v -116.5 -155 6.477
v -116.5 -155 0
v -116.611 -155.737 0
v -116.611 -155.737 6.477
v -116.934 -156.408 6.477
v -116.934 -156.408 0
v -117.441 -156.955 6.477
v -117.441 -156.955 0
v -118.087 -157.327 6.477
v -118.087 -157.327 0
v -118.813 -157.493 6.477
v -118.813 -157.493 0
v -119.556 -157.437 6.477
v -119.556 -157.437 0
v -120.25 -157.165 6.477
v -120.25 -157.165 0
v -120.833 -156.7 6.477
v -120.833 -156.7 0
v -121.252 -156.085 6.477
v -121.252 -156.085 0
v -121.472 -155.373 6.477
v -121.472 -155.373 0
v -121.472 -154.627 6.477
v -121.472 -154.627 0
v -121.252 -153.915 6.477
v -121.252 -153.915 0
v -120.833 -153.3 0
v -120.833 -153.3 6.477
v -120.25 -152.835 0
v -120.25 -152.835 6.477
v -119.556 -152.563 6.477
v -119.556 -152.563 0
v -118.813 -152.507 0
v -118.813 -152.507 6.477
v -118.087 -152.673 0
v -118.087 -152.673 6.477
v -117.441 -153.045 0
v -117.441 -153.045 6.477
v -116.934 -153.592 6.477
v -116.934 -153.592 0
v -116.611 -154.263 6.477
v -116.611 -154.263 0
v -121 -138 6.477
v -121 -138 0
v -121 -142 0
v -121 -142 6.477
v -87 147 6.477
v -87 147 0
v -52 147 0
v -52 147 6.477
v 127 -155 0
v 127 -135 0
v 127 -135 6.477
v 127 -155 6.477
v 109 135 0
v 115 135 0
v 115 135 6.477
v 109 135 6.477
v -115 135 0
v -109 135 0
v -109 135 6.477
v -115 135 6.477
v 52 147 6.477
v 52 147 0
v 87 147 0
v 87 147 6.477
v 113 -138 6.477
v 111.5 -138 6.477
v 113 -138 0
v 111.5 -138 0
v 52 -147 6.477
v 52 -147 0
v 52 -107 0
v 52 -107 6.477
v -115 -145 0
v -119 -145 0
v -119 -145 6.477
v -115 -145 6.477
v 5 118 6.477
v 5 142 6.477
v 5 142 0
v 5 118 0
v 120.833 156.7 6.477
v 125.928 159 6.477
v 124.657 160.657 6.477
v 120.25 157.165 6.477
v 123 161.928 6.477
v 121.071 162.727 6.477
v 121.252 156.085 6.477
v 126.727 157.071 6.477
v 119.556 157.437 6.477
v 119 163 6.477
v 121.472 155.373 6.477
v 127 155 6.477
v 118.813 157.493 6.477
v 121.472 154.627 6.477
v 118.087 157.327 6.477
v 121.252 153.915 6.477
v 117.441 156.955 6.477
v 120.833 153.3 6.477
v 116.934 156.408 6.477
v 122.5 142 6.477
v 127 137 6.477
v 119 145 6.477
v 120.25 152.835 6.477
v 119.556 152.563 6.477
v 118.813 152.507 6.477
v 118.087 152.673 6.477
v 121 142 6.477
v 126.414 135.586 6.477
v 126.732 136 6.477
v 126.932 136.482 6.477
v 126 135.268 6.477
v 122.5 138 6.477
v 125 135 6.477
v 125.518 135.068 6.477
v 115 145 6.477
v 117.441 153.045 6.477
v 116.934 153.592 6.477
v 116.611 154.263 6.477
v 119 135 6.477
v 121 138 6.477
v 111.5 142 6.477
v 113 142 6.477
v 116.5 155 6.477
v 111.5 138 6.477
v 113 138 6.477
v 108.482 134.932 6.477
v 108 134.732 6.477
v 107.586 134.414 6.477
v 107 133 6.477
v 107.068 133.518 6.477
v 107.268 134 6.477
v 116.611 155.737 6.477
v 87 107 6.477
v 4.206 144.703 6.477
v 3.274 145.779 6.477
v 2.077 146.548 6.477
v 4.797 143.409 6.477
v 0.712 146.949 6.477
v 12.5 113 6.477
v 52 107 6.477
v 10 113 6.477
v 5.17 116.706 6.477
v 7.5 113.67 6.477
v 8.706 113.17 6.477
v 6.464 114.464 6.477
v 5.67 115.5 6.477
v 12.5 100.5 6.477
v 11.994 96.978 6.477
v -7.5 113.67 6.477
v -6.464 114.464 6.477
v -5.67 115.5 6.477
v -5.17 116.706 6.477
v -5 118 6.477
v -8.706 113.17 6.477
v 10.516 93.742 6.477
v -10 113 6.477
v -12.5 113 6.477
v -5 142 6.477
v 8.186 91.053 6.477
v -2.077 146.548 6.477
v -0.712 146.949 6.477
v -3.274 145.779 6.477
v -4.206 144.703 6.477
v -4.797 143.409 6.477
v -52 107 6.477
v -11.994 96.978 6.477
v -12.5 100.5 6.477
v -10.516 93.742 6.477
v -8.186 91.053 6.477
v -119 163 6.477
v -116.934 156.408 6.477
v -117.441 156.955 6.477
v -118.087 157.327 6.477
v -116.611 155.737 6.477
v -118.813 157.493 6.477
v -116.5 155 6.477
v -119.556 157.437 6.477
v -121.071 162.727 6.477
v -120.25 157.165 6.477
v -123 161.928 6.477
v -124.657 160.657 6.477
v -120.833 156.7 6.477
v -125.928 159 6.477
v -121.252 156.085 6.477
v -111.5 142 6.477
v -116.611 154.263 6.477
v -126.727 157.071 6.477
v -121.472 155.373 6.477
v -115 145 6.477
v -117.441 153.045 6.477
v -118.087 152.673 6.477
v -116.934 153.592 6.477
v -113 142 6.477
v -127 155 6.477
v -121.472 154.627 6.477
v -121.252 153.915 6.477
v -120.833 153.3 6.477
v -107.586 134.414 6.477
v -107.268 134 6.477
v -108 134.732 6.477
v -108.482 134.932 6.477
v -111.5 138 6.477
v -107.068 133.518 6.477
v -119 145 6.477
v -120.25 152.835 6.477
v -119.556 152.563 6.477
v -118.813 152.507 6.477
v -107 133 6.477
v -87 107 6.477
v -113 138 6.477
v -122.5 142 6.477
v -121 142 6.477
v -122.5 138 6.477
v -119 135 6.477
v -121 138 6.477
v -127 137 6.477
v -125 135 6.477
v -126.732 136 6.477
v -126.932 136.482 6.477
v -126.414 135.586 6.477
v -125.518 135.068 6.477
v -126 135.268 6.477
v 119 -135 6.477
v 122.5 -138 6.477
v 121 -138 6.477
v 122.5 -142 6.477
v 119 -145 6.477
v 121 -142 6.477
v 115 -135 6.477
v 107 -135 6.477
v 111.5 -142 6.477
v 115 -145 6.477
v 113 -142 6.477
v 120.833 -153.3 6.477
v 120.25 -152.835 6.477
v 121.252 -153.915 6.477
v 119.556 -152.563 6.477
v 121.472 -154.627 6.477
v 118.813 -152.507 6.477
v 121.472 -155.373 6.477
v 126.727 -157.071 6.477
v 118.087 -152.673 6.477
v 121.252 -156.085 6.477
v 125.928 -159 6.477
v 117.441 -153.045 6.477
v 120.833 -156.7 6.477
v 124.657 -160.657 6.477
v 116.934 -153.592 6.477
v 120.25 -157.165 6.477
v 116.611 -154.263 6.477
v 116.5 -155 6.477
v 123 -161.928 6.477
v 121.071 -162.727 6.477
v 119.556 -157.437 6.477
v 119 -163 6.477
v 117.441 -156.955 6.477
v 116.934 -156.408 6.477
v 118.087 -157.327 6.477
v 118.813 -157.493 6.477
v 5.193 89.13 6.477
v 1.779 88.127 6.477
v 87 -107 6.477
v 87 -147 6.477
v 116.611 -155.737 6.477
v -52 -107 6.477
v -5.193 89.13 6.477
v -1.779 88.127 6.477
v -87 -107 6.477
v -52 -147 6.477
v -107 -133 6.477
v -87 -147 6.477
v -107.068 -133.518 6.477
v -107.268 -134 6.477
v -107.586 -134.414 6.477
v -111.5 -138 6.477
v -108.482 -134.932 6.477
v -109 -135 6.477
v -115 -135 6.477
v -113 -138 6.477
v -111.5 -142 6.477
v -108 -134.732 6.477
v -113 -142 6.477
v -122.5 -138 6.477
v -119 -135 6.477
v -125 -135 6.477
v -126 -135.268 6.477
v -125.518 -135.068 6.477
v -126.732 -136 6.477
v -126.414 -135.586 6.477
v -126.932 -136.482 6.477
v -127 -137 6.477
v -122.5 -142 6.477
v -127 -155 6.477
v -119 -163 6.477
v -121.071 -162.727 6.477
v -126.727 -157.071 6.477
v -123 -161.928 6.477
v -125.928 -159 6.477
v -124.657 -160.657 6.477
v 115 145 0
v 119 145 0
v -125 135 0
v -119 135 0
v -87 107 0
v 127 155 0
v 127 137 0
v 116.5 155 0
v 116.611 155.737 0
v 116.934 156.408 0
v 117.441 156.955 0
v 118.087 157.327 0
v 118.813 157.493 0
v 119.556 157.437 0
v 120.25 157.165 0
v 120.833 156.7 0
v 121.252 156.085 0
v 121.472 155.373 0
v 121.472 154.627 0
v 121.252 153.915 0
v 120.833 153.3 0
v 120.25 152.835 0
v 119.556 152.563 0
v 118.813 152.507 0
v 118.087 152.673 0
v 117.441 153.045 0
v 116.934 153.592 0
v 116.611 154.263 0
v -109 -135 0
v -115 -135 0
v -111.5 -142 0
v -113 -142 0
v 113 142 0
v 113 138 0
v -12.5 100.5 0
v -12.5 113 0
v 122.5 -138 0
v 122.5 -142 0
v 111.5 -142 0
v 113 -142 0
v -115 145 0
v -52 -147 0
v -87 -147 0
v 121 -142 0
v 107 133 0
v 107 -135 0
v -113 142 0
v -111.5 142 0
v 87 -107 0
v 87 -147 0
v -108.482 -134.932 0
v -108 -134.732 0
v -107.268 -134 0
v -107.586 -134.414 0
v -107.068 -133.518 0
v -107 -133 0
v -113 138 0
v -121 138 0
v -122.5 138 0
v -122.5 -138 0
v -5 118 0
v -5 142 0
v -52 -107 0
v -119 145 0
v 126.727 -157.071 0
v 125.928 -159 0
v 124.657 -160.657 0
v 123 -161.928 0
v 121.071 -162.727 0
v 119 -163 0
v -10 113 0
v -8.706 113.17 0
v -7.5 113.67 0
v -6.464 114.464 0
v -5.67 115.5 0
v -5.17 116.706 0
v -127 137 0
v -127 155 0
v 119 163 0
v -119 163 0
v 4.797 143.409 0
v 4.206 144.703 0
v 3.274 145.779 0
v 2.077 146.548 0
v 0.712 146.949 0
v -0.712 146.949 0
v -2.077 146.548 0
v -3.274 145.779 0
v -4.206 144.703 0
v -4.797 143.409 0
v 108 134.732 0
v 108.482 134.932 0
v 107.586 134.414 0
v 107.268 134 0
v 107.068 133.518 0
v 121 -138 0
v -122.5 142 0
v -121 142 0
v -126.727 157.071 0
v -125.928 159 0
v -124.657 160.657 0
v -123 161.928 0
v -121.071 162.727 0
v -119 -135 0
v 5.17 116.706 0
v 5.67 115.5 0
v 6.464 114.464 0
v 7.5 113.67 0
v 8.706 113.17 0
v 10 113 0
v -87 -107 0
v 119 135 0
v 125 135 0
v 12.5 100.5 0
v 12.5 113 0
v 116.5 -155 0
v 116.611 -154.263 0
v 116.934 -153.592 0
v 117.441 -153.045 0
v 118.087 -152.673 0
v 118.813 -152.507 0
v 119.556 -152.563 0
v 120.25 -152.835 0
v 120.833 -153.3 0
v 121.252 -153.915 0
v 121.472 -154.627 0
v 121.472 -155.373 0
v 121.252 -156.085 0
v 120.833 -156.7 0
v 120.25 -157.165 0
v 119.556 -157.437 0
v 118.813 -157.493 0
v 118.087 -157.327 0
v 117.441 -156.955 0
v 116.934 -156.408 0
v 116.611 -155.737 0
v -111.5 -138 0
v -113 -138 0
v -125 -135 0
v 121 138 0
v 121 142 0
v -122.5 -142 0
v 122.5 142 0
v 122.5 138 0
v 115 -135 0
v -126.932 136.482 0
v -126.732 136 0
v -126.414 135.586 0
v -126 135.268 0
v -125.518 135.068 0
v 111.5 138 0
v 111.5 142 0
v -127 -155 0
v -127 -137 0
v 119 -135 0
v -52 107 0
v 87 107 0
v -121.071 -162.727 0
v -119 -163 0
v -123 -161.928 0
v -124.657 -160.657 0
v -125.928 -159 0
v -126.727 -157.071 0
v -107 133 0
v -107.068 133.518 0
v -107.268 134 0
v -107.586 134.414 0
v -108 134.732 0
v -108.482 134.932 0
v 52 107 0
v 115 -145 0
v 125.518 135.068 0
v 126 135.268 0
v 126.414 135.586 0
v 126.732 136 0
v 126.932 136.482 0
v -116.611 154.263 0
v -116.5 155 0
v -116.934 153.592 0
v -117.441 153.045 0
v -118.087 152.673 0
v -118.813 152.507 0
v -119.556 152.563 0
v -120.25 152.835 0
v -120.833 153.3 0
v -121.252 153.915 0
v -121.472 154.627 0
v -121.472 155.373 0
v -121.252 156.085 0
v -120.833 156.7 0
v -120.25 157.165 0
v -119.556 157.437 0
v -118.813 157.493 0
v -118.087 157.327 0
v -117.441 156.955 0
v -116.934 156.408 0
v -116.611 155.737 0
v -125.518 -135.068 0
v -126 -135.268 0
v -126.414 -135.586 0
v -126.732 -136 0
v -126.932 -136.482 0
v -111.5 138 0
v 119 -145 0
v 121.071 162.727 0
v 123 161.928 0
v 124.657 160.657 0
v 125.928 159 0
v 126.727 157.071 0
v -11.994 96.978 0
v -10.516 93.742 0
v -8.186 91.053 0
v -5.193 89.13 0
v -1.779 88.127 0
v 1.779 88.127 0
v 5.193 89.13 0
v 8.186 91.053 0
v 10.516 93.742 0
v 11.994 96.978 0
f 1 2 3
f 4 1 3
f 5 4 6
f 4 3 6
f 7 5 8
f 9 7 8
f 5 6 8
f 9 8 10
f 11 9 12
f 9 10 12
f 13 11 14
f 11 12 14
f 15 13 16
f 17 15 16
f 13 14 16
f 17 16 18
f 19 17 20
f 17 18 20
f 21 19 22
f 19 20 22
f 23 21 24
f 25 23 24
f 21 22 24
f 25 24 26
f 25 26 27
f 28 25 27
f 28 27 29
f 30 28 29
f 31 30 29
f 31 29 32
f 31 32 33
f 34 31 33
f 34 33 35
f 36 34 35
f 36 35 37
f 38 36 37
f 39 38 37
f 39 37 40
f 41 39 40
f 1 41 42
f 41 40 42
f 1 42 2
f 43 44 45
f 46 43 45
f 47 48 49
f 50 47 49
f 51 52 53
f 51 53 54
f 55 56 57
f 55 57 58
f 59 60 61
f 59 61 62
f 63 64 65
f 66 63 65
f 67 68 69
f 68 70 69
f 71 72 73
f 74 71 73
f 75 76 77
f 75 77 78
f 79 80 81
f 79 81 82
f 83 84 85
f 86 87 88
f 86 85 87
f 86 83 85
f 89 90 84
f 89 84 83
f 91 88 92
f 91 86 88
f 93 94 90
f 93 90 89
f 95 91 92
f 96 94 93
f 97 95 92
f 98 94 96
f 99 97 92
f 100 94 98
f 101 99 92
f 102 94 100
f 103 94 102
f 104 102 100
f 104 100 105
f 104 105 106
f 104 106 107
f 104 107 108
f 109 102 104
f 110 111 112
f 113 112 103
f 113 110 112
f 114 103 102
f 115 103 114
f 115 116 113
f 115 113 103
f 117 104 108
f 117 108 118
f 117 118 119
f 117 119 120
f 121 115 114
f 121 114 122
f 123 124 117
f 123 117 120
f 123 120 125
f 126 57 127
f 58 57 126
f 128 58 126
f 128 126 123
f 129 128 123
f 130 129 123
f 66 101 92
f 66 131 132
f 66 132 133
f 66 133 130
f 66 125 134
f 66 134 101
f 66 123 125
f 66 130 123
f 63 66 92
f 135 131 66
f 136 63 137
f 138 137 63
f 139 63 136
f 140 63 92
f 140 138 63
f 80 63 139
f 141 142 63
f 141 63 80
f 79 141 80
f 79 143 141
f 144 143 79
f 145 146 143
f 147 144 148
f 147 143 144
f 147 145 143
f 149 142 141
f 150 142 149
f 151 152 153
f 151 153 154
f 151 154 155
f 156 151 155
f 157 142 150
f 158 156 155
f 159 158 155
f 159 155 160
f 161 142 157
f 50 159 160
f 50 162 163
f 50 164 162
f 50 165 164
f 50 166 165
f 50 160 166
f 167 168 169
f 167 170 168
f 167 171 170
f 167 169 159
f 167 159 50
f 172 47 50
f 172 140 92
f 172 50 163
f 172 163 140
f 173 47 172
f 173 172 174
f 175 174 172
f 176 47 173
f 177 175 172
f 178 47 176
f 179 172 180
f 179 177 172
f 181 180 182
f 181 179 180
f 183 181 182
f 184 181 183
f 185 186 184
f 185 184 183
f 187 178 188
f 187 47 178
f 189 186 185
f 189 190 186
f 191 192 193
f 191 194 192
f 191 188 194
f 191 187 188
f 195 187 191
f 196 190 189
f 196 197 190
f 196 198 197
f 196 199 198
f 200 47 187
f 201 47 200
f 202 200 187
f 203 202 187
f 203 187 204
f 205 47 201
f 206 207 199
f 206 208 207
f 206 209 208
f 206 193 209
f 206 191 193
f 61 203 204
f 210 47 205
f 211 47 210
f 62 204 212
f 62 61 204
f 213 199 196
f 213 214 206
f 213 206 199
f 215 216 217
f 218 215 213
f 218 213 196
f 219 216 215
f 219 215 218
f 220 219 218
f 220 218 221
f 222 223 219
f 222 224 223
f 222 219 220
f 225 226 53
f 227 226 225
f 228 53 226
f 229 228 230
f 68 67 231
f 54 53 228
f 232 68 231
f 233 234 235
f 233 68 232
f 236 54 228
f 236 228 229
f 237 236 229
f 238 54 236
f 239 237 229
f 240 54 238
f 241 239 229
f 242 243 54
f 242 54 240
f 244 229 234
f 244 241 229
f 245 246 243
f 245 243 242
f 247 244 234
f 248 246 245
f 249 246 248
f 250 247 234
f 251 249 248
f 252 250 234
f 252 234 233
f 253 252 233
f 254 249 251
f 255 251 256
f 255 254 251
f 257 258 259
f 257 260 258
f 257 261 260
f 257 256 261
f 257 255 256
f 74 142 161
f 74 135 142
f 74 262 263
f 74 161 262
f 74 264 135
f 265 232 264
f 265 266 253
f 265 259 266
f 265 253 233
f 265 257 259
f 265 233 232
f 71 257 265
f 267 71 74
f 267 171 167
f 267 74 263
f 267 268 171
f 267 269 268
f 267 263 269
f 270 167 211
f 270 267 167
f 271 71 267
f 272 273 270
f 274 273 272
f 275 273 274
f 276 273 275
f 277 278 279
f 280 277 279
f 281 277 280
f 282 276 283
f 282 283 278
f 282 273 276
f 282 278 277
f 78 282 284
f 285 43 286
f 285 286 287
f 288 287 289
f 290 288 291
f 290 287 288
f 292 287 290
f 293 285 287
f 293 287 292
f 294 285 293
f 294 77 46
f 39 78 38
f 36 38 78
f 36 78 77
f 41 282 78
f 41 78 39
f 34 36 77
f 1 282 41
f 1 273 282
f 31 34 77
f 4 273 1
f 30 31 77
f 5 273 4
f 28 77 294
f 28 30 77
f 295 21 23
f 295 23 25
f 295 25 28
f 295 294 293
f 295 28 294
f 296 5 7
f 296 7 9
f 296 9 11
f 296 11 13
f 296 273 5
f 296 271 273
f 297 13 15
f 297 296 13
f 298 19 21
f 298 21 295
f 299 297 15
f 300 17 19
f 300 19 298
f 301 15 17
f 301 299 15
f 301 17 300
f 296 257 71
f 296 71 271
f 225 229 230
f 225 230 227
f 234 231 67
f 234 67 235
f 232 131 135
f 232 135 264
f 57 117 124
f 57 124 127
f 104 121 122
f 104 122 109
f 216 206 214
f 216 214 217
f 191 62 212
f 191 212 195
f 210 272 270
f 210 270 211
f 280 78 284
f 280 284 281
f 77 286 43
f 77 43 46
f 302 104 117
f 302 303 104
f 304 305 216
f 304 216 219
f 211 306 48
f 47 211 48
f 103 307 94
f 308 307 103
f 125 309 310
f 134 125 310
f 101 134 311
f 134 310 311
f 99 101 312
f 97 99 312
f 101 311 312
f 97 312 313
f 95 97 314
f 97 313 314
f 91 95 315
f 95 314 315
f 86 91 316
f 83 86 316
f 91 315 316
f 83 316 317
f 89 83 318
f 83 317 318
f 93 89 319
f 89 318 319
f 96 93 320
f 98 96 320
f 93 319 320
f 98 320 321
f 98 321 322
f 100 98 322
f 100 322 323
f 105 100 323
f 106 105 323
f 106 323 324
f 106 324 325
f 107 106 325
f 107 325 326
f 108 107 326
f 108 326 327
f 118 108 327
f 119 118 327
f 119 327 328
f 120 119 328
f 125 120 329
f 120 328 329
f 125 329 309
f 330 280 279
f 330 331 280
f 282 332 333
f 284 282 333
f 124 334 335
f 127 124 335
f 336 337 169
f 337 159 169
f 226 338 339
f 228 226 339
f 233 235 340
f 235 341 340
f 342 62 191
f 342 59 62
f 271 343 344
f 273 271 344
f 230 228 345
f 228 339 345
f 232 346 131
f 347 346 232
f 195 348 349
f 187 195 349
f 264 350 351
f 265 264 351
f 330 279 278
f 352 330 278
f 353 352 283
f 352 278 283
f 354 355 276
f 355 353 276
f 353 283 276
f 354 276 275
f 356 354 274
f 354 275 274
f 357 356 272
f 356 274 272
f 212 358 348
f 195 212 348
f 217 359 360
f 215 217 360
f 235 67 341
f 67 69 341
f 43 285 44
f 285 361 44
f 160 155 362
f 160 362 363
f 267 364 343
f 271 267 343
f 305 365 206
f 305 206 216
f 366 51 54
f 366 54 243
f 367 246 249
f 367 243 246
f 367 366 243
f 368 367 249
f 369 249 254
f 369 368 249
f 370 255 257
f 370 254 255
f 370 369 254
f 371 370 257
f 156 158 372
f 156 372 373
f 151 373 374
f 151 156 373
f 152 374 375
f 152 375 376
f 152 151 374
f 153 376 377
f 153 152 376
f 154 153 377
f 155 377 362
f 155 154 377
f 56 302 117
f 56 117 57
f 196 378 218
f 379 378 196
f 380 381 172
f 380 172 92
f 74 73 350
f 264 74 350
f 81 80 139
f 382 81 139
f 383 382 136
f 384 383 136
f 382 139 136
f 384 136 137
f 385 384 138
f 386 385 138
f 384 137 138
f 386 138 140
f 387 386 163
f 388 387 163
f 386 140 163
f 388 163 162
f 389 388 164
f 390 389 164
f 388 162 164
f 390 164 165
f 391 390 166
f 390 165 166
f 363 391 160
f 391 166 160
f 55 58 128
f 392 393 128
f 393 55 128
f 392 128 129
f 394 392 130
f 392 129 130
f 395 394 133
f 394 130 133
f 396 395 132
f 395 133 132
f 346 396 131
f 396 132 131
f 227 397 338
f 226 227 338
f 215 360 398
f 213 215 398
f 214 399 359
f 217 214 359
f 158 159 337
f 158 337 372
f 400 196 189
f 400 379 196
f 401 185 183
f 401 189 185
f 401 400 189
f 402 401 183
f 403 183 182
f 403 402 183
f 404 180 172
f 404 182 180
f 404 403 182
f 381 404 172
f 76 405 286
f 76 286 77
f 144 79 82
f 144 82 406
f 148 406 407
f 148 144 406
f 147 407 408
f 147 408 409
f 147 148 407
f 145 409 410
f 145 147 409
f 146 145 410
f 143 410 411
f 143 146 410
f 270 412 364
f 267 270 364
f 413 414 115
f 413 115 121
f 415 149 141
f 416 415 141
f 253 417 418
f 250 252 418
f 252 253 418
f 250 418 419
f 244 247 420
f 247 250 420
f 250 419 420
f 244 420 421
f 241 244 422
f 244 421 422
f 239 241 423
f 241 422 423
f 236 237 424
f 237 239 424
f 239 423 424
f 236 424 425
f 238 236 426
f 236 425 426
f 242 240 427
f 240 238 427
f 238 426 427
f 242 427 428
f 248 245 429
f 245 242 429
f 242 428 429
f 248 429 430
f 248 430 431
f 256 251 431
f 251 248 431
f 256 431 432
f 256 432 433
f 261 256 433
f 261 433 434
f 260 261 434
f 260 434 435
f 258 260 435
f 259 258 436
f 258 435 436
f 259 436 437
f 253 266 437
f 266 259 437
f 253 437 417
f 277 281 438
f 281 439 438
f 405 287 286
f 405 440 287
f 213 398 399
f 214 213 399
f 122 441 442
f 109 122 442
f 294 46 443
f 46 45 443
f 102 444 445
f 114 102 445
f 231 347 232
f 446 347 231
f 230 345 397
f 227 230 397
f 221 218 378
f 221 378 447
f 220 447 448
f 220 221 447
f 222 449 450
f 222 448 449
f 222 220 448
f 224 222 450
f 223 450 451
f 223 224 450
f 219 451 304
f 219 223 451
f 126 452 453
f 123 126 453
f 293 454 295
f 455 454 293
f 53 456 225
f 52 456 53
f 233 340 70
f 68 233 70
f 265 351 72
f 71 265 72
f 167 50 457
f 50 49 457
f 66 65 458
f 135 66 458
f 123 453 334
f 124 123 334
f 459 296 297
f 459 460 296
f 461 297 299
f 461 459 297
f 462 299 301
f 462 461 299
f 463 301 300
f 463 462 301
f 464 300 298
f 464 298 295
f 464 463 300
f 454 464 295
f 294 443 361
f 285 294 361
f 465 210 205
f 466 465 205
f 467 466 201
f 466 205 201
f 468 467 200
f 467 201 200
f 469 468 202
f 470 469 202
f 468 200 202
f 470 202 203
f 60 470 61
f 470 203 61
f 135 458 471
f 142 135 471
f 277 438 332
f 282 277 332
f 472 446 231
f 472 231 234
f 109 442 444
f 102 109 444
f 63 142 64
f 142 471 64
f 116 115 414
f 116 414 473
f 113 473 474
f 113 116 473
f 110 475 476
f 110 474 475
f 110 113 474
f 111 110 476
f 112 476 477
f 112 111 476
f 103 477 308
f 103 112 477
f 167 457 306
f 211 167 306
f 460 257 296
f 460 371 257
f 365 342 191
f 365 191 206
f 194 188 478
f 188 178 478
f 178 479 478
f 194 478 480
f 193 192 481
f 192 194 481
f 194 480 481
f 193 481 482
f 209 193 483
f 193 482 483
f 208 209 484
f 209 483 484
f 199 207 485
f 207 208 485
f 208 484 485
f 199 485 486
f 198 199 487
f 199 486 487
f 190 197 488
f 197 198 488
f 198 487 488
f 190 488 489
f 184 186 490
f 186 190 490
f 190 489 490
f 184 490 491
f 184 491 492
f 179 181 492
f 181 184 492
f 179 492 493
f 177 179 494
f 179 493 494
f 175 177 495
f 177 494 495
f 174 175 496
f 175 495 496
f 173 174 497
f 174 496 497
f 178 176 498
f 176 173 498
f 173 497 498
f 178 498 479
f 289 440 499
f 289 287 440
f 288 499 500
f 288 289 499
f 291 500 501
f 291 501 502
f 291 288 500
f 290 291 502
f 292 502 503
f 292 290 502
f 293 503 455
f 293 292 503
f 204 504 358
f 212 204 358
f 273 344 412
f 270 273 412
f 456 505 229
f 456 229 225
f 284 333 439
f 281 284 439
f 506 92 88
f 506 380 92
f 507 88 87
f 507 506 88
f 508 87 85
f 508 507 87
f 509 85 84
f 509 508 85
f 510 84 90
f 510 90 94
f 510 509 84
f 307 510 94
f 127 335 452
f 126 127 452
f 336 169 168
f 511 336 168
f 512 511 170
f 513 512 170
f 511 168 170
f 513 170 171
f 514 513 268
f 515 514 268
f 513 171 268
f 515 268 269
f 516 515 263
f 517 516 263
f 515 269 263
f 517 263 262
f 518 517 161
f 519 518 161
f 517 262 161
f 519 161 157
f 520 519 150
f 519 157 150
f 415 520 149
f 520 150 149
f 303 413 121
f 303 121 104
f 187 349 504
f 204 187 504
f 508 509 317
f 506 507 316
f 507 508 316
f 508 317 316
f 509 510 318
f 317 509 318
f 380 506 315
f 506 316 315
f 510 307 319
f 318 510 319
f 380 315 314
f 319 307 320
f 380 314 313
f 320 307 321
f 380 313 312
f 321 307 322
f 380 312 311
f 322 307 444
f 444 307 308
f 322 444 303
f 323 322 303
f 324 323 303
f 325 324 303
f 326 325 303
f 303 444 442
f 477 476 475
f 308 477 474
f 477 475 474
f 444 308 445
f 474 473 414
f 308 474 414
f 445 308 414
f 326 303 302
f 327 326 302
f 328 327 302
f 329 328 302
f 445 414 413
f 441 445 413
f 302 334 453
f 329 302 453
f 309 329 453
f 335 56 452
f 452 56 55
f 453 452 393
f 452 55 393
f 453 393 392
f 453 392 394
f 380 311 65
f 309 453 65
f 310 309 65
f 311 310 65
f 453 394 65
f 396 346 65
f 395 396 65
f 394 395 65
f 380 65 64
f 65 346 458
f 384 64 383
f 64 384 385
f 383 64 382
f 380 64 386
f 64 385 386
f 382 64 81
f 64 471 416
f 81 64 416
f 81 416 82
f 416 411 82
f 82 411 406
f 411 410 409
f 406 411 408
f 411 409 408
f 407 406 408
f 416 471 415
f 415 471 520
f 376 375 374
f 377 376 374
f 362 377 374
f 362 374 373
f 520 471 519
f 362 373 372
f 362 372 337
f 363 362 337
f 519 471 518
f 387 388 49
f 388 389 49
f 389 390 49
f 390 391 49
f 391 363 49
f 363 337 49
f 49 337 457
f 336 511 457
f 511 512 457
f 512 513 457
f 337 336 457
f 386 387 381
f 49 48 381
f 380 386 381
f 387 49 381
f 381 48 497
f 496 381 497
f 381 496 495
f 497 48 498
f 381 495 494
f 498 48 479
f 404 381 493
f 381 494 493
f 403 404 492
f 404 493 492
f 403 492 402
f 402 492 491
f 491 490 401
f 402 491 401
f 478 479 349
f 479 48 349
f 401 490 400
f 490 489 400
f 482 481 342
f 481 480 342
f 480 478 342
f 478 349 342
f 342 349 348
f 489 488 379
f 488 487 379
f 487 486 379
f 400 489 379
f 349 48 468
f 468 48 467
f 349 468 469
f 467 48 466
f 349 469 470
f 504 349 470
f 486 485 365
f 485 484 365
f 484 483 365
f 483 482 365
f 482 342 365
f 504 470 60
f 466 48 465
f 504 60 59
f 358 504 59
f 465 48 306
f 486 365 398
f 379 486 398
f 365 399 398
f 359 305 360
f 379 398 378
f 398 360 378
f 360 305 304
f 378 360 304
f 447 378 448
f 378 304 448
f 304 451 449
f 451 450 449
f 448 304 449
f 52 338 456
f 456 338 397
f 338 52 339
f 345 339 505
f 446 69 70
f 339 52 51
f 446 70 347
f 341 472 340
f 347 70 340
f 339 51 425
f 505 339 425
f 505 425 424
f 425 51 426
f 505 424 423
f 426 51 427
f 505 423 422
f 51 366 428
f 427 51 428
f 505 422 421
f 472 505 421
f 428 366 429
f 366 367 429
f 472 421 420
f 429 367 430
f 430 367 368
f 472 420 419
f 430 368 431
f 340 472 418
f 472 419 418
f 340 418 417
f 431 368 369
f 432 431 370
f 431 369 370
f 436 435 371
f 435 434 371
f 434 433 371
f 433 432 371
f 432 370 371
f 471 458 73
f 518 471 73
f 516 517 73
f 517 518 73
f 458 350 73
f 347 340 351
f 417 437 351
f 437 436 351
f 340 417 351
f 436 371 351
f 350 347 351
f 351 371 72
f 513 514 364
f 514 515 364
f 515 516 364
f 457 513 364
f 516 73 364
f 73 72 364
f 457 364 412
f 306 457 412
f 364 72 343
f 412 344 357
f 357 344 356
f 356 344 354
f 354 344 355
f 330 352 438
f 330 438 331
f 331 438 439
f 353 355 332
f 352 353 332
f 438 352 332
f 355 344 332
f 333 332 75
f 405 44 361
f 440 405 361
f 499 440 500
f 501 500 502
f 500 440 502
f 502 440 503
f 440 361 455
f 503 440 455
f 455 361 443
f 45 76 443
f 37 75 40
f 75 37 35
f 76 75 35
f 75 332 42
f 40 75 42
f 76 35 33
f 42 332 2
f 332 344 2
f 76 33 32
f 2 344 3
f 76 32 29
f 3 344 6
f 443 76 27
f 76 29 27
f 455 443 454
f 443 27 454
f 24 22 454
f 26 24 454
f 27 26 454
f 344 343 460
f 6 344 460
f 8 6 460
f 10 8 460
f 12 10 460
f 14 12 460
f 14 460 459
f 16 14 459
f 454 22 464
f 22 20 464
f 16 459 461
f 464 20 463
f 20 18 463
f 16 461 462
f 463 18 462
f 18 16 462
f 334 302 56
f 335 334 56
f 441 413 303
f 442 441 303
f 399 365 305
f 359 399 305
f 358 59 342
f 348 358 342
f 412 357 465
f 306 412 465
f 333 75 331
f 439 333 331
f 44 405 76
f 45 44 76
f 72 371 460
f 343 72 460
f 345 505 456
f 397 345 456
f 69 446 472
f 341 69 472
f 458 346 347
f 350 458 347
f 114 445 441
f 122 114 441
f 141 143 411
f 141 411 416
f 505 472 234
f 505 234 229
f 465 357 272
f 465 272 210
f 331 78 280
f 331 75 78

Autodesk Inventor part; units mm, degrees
ref_plane "YZ Plane" through (0, 0, 0) normal (1, 0, 0) x (0, 1, 0)
ref_plane "XZ Plane" through (0, 0, 0) normal (0, 1, 0) x (-1, 0, 0)
ref_plane "XY Plane" through (0, 0, 0) normal (0, 0, 1) x (1, 0, 0)
sketch "Sketch1" plane through (0, 0, 0) normal (0, 0, 1) x (1, 0, 0)
  line L0 (0, 0) -> (-107, 0)
  line L1 (-107, 0) -> (-107, 135)
  line L2 (-107, 135) -> (-115, 135)
  line L3 (-115, 135) -> (-115, 145)
  line L4 (-115, 145) -> (-119, 145)
  line L5 (-119, 145) -> (-119, 135)
  line L6 (-119, 135) -> (-127, 135)
  line L7 (-127, 135) -> (-127, 155)
  arc A0 (-119, 163) -> (-127, 155) centre (-119, 155) ccw
  line L8 (-119, 163) -> (0, 163)
  line L9 (0, 163) -> (0, 0)
  circle A1 centre (-119, 155) radius 2.5
  line L10 (-122.5, 142) -> (-121, 142)
  line L11 (-121, 142) -> (-121, 138)
  line L12 (-121, 138) -> (-122.5, 138)
  line L13 (-122.5, 138) -> (-122.5, 142)
  line L14 (-113, 142) -> (-111.5, 142)
  line L15 (-111.5, 142) -> (-111.5, 138)
  line L16 (-111.5, 138) -> (-113, 138)
  line L17 (-113, 138) -> (-113, 142)
  line L18 (-87, 147) -> (-52, 147)
  line L19 (-52, 147) -> (-52, 107)
  line L20 (-52, 107) -> (-87, 107)
  line L21 (-87, 107) -> (-87, 147)
  point P0 (-117, 145)
  point P1 (-121, 140)
  point P2 (-119, 140)
  point P3 (-113, 140)
  point P4 (-115, 140)
  point P5 (-52, 127)
  dimension "d1" = 145
  dimension "d3" = 4
  dimension "d4" = 10
  dimension "d5" = 10
  dimension "d6" = 10
  dimension "d7" = 127
  dimension "d8" = 8
  dimension "d9" = 10
  dimension "d10" = 5
  dimension "d14" = 4
  dimension "d15" = 8
  dimension "d16" = 1.5
  dimension "d17" = 4
  dimension "d18" = 40
  dimension "d19" = 35
  dimension "d20" = 127
  dimension "d21" = 20
extrude "Extrusion1" add sketch "Sketch1" along normal blind 6.477
fillet "Fillet1" radius 2 2 edges at (-107, 135, 3.2385) (-127, 135, 3.2385)
mirror "Mirror1" about plane through (-107, 0, 0) normal (0, -1, 0) of "Extrusion1", "Fillet1"
mirror "Mirror2" about plane through (0, 0, 0) normal (1, 0, 0) of "Extrusion1", "Mirror1", "Fillet1"
sketch "Sketch2" plane through (0, 0, 6.477) normal (0, 0, 1) x (1, 0, 0)
  arc A0 (5, 118) -> (10, 113) centre (10, 118) ccw projected
  line L0 (10, 113) -> (113, 113) projected
  line L1 (113, 113) -> (113, -113) projected
  line L2 (113, -113) -> (-113, -113) projected
  line L3 (-113, -113) -> (-113, 113) projected
  line L4 (-113, 113) -> (-10, 113) projected
  arc A1 (-10, 113) -> (-5, 118) centre (-10, 118) ccw projected
  line L5 (-5, 118) -> (-5, 142) projected
  arc A2 (5, 142) -> (-5, 142) centre (0, 142) ccw projected
  line L6 (5, 142) -> (5, 118) projected
  line L7 (-52, 147) -> (-52, 127) projected
  line L8 (-52, 127) -> (-87, 127) projected
  line L9 (-87, 127) -> (-87, 147) projected
  line L10 (-87, 147) -> (-52, 147) projected
  line L11 (-52, -147) -> (-87, -147) projected
  line L12 (-87, -147) -> (-87, -127) projected
  line L13 (-87, -127) -> (-52, -127) projected
  line L14 (-52, -127) -> (-52, -147) projected
  line L15 (52, 147) -> (87, 147) projected
  line L16 (87, 147) -> (87, 127) projected
  line L17 (87, 127) -> (52, 127) projected
  line L18 (52, 127) -> (52, 147) projected
  line L19 (52, -147) -> (52, -127) projected
  line L20 (52, -127) -> (87, -127) projected
  line L21 (87, -127) -> (87, -147) projected
  line L22 (87, -147) -> (52, -147) projected
  circle A3 centre (-119, 155) radius 2.5 projected
  circle A4 centre (-119, -155) radius 2.5 projected
  circle A5 centre (119, 155) radius 2.5 projected
  circle A6 centre (119, -155) radius 2.5 projected
  line L23 (-121, 138) -> (-122.5, 138) projected
  line L24 (-122.5, 138) -> (-122.5, 142) projected
  line L25 (-122.5, 142) -> (-121, 142) projected
  line L26 (-121, 142) -> (-121, 138) projected
  line L27 (-111.5, 138) -> (-113, 138) projected
  line L28 (-113, 138) -> (-113, 142) projected
  line L29 (-113, 142) -> (-111.5, 142) projected
  line L30 (-111.5, 142) -> (-111.5, 138) projected
  line L31 (-111.5, -142) -> (-113, -142) projected
  line L32 (-113, -142) -> (-113, -138) projected
  line L33 (-113, -138) -> (-111.5, -138) projected
  line L34 (-111.5, -138) -> (-111.5, -142) projected
  line L35 (-121, -142) -> (-122.5, -142) projected
  line L36 (-122.5, -142) -> (-122.5, -138) projected
  line L37 (-122.5, -138) -> (-121, -138) projected
  line L38 (-121, -138) -> (-121, -142) projected
  line L39 (111.5, 142) -> (113, 142) projected
  line L40 (113, 142) -> (113, 138) projected
  line L41 (113, 138) -> (111.5, 138) projected
  line L42 (111.5, 138) -> (111.5, 142) projected
  line L43 (121, 142) -> (122.5, 142) projected
  line L44 (122.5, 142) -> (122.5, 138) projected
  line L45 (122.5, 138) -> (121, 138) projected
  line L46 (121, 138) -> (121, 142) projected
  line L47 (111.5, -138) -> (113, -138) projected
  line L48 (113, -138) -> (113, -142) projected
  line L49 (113, -142) -> (111.5, -142) projected
  line L50 (111.5, -142) -> (111.5, -138) projected
  line L51 (121, -138) -> (122.5, -138) projected
  line L52 (122.5, -138) -> (122.5, -142) projected
  line L53 (122.5, -142) -> (121, -142) projected
  line L54 (121, -142) -> (121, -138) projected
  line L55 (-127, 155) -> (-127, -155) projected
  arc A7 (-127, -155) -> (-119, -163) centre (-119, -155) ccw projected
  line L56 (-119, -163) -> (119, -163) projected
  arc A8 (119, -163) -> (127, -155) centre (119, -155) ccw projected
  line L57 (127, -155) -> (127, 155) projected
  arc A9 (127, 155) -> (119, 163) centre (119, 155) ccw projected
  line L58 (119, 163) -> (-119, 163) projected
  arc A10 (-119, 163) -> (-127, 155) centre (-119, 155) ccw projected
  line L59 (-12.5, 113) -> (-12.5, 100.5)
  arc A11 (-12.5, 100.5) -> (12.5, 100.5) centre (0, 100.5) ccw
  line L60 (12.5, 100.5) -> (12.5, 113)
  point P0 (0, 0)
  dimension "d22" = 12.5
  dimension "d24" = 12.5
extrude "Extrusion2" cut sketch "Sketch2" against normal through all contours A0 L0 L60 A11 L59 L4 A1 L5 A2 L6
properties part number "BED PLATE BOTTOM"
